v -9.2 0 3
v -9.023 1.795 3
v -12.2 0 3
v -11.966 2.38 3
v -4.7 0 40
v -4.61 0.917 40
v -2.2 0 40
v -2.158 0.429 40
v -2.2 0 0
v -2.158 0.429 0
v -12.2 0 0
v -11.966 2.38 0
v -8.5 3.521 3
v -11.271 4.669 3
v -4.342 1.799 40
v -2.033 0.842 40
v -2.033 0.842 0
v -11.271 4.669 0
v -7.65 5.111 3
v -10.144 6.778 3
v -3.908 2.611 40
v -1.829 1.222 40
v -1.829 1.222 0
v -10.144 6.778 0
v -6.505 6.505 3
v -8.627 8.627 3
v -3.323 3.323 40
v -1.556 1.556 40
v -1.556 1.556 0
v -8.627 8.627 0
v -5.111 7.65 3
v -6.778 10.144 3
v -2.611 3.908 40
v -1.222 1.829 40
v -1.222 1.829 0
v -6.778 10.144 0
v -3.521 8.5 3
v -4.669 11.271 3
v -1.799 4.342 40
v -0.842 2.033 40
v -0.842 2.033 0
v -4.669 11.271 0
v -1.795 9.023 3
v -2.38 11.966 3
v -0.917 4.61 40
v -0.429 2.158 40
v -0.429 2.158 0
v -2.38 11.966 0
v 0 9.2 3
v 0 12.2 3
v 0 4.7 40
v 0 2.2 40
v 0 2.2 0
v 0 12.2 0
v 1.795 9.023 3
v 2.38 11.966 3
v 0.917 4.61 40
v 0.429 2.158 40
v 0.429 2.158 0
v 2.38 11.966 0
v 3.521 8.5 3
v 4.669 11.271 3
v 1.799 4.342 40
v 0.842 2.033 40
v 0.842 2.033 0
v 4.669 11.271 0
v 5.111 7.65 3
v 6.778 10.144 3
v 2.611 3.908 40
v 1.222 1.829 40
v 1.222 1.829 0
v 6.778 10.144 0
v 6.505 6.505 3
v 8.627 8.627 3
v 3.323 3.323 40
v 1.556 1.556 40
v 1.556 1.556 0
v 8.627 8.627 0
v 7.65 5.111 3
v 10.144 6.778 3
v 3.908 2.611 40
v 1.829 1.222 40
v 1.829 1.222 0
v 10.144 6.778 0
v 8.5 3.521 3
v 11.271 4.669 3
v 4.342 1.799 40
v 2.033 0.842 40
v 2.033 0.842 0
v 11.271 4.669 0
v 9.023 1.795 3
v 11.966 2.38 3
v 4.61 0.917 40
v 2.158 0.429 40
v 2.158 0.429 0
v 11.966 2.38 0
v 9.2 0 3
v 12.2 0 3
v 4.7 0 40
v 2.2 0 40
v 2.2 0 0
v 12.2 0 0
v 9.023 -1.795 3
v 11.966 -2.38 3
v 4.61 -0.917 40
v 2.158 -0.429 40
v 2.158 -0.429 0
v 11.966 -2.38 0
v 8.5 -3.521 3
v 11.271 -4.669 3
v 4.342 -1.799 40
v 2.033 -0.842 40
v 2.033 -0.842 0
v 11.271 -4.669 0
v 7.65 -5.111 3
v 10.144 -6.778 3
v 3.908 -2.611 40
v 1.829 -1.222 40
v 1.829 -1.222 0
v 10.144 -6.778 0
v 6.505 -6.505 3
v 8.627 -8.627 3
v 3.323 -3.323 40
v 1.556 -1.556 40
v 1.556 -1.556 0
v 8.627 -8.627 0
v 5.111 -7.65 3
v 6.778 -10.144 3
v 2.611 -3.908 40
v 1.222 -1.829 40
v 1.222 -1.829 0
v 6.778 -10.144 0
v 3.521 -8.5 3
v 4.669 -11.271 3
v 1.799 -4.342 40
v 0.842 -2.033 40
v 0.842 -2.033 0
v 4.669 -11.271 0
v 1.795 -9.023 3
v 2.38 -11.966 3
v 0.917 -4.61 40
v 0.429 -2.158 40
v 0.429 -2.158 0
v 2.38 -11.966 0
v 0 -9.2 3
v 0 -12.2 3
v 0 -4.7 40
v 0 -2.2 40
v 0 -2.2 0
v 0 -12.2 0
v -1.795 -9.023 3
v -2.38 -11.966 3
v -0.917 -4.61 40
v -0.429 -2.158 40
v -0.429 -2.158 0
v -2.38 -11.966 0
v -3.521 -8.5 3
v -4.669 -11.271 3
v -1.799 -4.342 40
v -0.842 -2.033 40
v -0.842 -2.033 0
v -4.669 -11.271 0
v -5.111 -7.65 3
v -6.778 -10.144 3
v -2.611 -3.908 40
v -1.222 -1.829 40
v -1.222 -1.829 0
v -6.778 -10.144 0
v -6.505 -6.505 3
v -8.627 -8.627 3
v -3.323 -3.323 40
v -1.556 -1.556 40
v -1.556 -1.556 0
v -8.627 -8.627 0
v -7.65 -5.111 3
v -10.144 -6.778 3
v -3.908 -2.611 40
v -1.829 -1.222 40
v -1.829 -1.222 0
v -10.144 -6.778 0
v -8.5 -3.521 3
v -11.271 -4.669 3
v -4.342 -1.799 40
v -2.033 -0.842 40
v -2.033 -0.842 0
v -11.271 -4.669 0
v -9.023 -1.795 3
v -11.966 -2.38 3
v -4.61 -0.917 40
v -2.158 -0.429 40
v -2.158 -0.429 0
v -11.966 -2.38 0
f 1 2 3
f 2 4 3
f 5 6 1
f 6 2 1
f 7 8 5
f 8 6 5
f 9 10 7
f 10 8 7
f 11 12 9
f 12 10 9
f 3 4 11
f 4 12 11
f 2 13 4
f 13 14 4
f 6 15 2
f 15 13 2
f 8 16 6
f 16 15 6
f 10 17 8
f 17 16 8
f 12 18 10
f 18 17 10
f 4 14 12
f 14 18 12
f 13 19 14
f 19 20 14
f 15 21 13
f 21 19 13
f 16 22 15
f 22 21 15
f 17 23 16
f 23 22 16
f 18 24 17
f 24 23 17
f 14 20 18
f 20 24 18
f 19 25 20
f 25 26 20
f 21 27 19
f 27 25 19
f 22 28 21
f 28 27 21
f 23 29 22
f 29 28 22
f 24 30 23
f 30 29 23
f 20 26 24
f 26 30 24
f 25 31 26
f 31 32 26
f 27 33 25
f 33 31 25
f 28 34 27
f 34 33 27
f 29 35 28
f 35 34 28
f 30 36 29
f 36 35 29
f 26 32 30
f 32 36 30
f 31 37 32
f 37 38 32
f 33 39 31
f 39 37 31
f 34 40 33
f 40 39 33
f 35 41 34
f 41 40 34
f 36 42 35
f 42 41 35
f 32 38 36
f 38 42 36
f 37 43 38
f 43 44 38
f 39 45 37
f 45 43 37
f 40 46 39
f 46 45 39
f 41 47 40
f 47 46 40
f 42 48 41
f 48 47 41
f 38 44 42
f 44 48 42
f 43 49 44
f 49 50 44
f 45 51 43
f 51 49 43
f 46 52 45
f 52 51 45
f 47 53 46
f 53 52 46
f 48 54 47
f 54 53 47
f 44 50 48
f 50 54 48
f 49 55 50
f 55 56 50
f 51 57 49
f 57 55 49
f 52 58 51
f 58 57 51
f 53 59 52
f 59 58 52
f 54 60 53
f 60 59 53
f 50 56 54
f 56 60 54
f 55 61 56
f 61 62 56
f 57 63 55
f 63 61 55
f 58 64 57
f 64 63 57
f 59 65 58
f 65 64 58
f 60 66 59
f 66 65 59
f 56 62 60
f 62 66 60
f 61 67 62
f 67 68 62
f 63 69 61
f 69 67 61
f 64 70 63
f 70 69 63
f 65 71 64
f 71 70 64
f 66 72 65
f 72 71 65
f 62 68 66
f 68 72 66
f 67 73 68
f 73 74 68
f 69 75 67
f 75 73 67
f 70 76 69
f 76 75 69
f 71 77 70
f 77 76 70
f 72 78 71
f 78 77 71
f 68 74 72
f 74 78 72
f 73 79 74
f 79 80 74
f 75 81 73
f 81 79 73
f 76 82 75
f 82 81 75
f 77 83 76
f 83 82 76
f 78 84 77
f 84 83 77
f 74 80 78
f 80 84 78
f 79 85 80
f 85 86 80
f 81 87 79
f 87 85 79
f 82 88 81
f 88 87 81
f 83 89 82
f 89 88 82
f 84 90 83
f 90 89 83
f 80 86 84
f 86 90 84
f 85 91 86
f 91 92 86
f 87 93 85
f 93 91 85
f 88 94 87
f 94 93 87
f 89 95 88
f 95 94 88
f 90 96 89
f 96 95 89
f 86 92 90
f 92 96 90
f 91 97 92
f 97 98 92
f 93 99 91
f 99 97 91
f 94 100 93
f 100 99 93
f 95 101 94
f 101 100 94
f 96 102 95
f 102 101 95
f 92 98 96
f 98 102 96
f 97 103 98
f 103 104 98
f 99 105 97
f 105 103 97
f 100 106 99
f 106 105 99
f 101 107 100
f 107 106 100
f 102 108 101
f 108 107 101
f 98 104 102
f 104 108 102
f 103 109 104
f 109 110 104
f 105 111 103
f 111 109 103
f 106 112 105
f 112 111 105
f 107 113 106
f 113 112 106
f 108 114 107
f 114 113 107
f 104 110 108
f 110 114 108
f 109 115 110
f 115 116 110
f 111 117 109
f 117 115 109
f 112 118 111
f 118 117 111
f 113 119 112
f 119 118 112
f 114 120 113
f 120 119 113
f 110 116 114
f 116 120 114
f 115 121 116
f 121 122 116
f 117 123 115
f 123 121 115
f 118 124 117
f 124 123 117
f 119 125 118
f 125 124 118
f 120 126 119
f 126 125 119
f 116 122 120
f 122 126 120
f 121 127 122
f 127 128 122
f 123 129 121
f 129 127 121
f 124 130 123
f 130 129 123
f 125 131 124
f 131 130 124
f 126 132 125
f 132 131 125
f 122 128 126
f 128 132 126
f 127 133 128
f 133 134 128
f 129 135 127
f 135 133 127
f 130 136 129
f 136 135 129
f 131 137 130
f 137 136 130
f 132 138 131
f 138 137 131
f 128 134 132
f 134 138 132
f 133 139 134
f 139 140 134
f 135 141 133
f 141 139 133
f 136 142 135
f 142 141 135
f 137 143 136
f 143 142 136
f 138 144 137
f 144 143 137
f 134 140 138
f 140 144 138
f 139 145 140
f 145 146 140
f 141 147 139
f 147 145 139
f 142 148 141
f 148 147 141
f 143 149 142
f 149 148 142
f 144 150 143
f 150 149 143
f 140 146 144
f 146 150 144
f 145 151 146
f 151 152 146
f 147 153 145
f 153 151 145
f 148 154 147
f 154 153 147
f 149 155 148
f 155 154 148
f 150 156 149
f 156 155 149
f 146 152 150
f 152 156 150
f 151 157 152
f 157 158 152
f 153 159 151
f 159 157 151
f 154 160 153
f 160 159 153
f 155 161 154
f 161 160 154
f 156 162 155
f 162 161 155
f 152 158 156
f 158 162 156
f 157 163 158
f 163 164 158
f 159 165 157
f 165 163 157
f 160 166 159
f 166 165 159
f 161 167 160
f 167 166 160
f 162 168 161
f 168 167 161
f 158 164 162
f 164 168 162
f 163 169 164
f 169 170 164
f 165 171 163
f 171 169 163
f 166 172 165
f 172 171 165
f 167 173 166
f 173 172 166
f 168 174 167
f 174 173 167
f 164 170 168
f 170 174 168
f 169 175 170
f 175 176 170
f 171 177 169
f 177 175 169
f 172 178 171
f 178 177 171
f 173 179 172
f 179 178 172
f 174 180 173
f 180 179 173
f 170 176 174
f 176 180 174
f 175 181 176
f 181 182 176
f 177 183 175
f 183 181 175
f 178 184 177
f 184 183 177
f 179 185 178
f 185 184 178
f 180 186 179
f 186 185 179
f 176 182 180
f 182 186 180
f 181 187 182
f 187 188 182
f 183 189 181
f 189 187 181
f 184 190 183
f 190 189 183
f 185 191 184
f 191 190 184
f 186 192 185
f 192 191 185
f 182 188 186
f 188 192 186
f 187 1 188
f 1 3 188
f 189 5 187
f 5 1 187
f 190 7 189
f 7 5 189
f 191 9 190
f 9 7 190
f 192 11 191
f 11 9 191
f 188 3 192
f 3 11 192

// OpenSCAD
$fn = 32;

// ----------------------------------------------------------------------
// Profiled standoff: conical spacer, 40 mm long, bore 4.4 mm
// ----------------------------------------------------------------------

// --- parameters (mm) ---
revolve_angle = 360;      // full turn around the Z axis
profile_points = 6;       // points of the closed outline

profile = [[2.2, 0], [12.2, 0], [12.2, 3], [9.2, 3], [4.7, 40], [2.2, 40]];  // single closed polygon, 6 points, counter clockwise

// --- the one profile operation ---
rotate_extrude(angle = revolve_angle) polygon(points = profile);
